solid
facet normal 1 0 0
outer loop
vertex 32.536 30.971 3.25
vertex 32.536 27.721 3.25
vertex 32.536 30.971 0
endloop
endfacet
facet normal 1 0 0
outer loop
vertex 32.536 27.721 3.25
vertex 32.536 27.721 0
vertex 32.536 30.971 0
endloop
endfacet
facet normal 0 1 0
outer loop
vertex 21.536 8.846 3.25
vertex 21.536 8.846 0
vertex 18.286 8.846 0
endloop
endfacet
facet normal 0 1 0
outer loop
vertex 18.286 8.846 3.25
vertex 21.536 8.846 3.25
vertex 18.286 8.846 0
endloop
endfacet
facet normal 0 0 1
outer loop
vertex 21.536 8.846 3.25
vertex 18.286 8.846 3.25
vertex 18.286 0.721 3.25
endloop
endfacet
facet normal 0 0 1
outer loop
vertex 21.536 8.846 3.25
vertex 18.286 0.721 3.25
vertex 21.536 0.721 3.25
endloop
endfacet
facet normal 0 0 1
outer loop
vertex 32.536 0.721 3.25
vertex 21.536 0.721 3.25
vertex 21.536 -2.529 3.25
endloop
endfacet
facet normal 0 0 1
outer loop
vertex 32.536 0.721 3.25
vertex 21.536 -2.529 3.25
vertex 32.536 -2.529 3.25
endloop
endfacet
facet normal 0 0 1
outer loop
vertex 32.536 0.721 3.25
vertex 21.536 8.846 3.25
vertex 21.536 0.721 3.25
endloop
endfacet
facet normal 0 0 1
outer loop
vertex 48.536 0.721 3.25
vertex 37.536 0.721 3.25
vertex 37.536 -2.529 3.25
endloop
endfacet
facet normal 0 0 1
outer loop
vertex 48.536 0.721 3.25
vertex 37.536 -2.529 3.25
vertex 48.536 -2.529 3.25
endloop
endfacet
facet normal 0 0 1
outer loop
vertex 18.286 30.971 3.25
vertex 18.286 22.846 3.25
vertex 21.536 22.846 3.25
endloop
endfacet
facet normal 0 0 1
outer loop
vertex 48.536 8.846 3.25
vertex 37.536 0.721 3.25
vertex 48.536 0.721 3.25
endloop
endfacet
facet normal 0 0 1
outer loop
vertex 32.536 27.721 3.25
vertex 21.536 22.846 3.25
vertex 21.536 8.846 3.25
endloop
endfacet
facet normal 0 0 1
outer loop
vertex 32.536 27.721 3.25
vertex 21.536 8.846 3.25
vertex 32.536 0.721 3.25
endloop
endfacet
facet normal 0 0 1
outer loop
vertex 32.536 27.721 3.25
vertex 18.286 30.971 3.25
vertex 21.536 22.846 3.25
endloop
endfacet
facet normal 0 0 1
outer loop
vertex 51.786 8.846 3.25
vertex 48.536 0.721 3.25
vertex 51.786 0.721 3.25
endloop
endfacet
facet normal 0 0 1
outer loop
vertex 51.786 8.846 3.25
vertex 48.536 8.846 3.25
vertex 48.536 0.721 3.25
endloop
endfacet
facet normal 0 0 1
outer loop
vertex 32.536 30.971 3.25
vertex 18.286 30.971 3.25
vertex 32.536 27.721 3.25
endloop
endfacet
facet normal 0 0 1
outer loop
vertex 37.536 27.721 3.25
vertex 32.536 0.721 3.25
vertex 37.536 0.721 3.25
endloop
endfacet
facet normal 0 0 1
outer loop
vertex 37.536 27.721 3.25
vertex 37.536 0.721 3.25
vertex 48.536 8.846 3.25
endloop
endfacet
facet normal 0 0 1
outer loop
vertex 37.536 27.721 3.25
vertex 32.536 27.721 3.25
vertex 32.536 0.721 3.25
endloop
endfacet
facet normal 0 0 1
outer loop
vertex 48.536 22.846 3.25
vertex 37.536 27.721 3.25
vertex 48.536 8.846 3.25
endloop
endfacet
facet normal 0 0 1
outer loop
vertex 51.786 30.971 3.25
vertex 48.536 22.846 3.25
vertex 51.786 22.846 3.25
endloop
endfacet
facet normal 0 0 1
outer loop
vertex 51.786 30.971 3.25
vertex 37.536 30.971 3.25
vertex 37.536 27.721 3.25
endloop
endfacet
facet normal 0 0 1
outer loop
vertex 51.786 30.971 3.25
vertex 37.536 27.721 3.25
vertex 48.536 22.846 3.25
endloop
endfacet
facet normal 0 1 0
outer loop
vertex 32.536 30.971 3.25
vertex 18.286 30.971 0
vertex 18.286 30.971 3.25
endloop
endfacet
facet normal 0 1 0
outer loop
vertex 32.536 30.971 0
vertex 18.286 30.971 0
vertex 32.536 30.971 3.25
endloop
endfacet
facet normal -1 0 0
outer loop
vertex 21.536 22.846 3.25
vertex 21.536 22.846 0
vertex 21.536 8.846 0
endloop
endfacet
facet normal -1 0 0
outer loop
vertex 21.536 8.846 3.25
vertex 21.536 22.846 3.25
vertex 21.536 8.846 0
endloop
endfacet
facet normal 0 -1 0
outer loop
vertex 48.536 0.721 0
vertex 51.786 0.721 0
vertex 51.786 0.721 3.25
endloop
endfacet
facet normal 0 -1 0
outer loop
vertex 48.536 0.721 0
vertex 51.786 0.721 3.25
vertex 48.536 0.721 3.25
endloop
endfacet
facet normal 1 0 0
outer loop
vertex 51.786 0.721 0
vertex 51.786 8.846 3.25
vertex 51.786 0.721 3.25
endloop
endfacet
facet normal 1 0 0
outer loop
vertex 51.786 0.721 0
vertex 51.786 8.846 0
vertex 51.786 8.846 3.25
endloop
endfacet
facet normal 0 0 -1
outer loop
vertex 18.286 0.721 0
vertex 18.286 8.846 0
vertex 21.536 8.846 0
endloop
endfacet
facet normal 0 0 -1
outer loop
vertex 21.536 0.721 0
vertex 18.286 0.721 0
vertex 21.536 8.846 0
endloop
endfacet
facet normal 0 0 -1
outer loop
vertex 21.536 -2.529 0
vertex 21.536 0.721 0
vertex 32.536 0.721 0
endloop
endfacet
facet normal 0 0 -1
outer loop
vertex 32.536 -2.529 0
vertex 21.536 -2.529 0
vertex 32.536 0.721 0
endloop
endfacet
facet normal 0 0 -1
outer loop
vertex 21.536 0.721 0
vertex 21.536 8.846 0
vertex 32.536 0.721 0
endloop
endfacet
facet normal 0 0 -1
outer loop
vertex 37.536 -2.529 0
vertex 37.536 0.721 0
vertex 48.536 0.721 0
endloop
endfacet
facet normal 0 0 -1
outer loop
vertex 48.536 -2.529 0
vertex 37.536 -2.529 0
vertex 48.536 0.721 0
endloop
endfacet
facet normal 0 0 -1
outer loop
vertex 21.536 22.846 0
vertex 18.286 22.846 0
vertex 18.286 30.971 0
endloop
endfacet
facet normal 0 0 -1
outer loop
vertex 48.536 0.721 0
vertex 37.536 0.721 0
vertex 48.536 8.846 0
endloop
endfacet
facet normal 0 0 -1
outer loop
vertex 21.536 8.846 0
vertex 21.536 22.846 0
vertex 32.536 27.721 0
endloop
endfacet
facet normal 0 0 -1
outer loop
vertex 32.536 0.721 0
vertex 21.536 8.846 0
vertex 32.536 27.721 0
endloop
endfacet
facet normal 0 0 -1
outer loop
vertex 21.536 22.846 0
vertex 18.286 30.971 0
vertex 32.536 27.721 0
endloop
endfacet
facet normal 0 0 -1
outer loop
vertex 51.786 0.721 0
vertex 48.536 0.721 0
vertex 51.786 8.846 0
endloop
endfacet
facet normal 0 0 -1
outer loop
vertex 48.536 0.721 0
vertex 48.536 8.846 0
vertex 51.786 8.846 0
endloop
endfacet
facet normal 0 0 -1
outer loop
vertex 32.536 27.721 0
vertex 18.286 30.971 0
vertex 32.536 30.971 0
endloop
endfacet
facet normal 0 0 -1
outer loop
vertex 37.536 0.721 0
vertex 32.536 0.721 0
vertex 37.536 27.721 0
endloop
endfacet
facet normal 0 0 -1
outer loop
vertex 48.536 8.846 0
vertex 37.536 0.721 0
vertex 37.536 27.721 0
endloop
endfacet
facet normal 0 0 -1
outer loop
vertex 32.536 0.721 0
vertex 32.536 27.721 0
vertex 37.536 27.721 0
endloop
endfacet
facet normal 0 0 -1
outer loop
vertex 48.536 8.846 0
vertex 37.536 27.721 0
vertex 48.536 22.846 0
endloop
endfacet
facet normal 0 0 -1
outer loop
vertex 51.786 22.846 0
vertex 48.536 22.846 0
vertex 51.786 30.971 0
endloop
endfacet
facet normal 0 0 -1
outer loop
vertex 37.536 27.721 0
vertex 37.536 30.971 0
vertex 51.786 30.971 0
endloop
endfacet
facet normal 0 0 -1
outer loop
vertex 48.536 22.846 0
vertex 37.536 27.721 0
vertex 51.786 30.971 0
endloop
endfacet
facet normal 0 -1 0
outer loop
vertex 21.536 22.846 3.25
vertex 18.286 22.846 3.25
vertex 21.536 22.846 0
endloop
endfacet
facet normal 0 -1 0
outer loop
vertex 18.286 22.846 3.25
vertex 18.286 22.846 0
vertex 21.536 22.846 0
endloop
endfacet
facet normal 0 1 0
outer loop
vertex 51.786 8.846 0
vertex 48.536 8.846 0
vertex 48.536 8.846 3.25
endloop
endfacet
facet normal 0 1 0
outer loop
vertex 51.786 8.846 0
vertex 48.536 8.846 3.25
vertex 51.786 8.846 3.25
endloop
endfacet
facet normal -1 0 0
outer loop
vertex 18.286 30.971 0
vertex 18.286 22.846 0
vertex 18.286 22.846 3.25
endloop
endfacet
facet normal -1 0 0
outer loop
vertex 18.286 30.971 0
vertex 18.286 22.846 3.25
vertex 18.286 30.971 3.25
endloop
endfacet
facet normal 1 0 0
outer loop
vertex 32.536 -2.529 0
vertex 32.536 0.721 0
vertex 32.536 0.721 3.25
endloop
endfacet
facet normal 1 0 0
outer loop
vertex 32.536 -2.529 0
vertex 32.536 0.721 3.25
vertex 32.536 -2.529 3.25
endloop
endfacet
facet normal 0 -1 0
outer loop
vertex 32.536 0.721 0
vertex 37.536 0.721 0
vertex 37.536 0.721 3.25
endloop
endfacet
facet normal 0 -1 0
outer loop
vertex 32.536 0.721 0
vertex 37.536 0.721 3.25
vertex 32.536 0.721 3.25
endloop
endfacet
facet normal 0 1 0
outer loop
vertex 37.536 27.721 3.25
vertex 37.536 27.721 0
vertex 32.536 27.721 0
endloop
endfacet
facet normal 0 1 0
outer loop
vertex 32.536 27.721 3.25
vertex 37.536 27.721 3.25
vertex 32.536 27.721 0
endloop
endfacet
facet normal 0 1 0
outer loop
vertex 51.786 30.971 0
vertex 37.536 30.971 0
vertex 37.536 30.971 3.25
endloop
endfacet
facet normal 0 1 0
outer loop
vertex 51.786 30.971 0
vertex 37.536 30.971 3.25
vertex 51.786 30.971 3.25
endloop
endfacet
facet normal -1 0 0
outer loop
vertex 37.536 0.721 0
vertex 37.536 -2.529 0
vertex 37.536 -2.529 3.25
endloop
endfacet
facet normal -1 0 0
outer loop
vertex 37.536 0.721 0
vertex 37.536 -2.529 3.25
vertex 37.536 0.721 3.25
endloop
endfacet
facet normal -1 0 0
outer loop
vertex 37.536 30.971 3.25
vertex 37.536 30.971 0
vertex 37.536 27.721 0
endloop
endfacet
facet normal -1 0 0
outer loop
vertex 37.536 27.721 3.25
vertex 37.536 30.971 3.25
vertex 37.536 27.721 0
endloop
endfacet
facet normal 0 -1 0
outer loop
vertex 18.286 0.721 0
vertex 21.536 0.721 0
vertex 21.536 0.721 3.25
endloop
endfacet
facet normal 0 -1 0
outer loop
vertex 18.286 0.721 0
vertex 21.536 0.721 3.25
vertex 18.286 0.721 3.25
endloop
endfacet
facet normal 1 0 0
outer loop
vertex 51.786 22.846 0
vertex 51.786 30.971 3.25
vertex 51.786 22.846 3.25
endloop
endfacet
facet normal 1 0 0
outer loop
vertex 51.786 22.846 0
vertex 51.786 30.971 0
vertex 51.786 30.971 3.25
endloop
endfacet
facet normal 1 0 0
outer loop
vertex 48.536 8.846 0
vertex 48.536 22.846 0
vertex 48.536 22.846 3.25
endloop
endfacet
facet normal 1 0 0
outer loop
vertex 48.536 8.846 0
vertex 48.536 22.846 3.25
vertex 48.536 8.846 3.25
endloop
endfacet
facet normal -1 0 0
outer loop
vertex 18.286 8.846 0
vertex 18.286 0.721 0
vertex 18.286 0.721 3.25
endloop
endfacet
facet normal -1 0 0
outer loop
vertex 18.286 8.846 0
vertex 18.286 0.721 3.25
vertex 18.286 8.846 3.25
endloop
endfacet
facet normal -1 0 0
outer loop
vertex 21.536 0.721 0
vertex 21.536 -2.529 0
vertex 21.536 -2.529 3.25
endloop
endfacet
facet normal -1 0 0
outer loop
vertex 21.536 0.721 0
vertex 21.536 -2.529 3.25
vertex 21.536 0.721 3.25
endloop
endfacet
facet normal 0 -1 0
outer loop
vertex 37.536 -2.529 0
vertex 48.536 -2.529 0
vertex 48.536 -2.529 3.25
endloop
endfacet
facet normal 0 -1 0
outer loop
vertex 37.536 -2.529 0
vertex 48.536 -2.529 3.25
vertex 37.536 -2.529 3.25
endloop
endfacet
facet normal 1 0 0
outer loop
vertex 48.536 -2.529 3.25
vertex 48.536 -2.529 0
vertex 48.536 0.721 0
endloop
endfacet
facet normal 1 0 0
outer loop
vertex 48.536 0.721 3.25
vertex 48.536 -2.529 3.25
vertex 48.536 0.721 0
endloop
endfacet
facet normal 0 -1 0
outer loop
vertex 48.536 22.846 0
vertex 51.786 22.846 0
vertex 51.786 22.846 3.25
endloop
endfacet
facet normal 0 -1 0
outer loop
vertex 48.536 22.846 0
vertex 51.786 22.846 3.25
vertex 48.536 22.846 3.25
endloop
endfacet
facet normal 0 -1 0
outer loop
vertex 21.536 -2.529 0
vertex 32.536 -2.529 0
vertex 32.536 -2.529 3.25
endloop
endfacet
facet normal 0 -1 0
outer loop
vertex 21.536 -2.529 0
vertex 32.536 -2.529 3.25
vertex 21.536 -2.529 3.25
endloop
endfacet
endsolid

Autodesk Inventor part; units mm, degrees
ref_plane "YZ Plane" through (0, 0, 0) normal (1, 0, 0) x (0, 1, 0)
ref_plane "XZ Plane" through (0, 0, 0) normal (0, 1, 0) x (-1, 0, 0)
ref_plane "XY Plane" through (0, 0, 0) normal (0, 0, 1) x (1, 0, 0)
sketch "Block1" plane through (0, 0, 0) normal (0, 0, 1) x (1, 0, 0)
  circle A0 centre (74.029, 24.2723) radius 1
  line L0 (49.279, 30.4723) -> (71.779, 30.4723)
  line L1 (71.779, 30.4723) -> (71.779, 18.0723)
  line L2 (71.779, 18.0723) -> (49.279, 18.0723)
  line L3 (49.279, 18.0723) -> (49.279, 30.4723)
  line L4 (49.279, 30.4723) -> (44.779, 30.4723)
  line L5 (44.779, 30.4723) -> (44.779, 18.0723)
  line L6 (44.779, 18.0723) -> (49.279, 18.0723)
  line L7 (49.279, 18.0723) -> (49.279, 30.4723)
  line L8 (71.779, 30.4723) -> (76.279, 30.4723)
  line L9 (76.279, 30.4723) -> (76.279, 18.0723)
  line L10 (76.279, 18.0723) -> (71.779, 18.0723)
  line L11 (71.779, 18.0723) -> (71.779, 30.4723)
  line L12 (44.779, 24.2723) -> (76.279, 24.2723) construction
  line L13 (47.029, 30.4723) -> (47.029, 18.0723) construction
  circle A1 centre (47.029, 24.2723) radius 1
  line L14 (74.029, 30.4723) -> (74.029, 18.0723) construction
  point P0 (60.979, 24.0984)
  dimension "d7" = 22.5
  dimension "d8" = 12.4
  dimension "d9" = 4.5
  dimension "d10" = 4.5
  dimension "d11" = 2
  dimension "d12" = 2
sketch "Sketch1" plane through (0, 0, 0) normal (0, 0, 1) x (1, 0, 0)
  line L0 (-92.7646, -8.503) -> (-89.7646, -8.503)
  line L1 (-89.7646, -8.503) -> (-89.7646, -11.753)
  line L2 (-89.7646, -11.753) -> (-92.7646, -11.753)
  line L3 (-92.7646, -11.753) -> (-92.7646, -8.503)
  line L4 (-92.7646, -21.6527) -> (-89.7646, -21.6527)
  line L5 (-89.7646, -21.6527) -> (-89.7646, -21.7527)
  line L6 (-89.7646, -21.7527) -> (-92.7646, -21.7527)
  line L7 (-92.7646, -21.7527) -> (-92.7646, -21.6527)
  line L8 (18.2857, 30.9706) -> (51.7857, 30.9706)
  line L9 (51.7857, 30.9706) -> (51.7857, 0.7206)
  line L10 (51.7857, 0.7206) -> (18.2857, 0.7206)
  line L11 (18.2857, 0.7206) -> (18.2857, 30.9706)
  line L12 (18.2857, 22.8456) -> (21.5357, 22.8456)
  line L13 (21.5357, 22.8456) -> (21.5357, 8.8456)
  line L14 (21.5357, 8.8456) -> (18.2857, 8.8456)
  line L15 (18.2857, 8.8456) -> (18.2857, 22.8456)
  line L16 (35.0357, 30.9706) -> (35.0357, 0.7206) construction
  line L17 (51.7857, 22.8456) -> (48.5357, 22.8456)
  line L18 (48.5357, 22.8456) -> (48.5357, 8.8456)
  line L19 (48.5357, 8.8456) -> (51.7857, 8.8456)
  line L20 (51.7857, 8.8456) -> (51.7857, 22.8456)
  line L21 (32.5357, -2.5294) -> (37.5357, -2.5294)
  line L22 (37.5357, -2.5294) -> (37.5357, 0.7206)
  line L23 (37.5357, 0.7206) -> (32.5357, 0.7206)
  line L24 (32.5357, 0.7206) -> (32.5357, -2.5294)
  line L25 (35.0357, 0.7206) -> (35.0357, -2.5294) construction
  line L26 (18.2857, 14.2206) -> (51.7857, 14.2206) construction
  line L27 (32.5357, 30.9706) -> (37.5357, 30.9706)
  line L28 (37.5357, 30.9706) -> (37.5357, 27.7206)
  line L29 (37.5357, 27.7206) -> (32.5357, 27.7206)
  line L30 (32.5357, 27.7206) -> (32.5357, 30.9706)
  line L31 (35.0357, 27.7206) -> (35.0357, 30.9706) construction
  line L32 (18.2857, 0.7206) -> (51.7857, 0.7206)
  line L33 (51.7857, 0.7206) -> (51.7857, -2.5294)
  line L34 (51.7857, -2.5294) -> (18.2857, -2.5294)
  line L35 (18.2857, -2.5294) -> (18.2857, 0.7206)
  line L36 (18.2857, -2.5294) -> (21.5357, -2.5294)
  line L37 (21.5357, -2.5294) -> (21.5357, 0.7206)
  line L38 (21.5357, 0.7206) -> (18.2857, 0.7206)
  line L39 (18.2857, 0.7206) -> (18.2857, -2.5294)
  line L40 (51.7857, -2.5294) -> (48.5357, -2.5294)
  line L41 (48.5357, -2.5294) -> (48.5357, 0.7206)
  line L42 (48.5357, 0.7206) -> (51.7857, 0.7206)
  line L43 (51.7857, 0.7206) -> (51.7857, -2.5294)
  point P0 (0, 0)
  point P1 (35.0357, 27.7206)
  dimension "d0" = 3
  dimension "mat" = 3.25
  dimension "d2" = 3
  dimension "d3" = 0.1
  dimension "d32" = 33.5
  dimension "d34" = 3.25
  dimension "d35" = 14
  dimension "d36" = 8.125
  dimension "d39" = 5
  dimension "d40" = 3.25
  dimension "d45" = 8.125
  dimension "d46" = 3.25
extrude "Extrusion3" add sketch "Sketch1" along normal blind 3.25 contours L8 L30 L29 L28 L9 L17 L18 L19 L10 L11 L14 L13 L12 | L8 L28 L29 L30
extrude "Extrusion6" add sketch "Sketch1" along normal blind 3.25 contours L10 L37 L34 L35 | L10 L24 L34 L37 | L33 L34 L41 L10 | L10 L41 L34 L22
extrude "Extrusion7" cut sketch "Sketch1" along normal blind 3.25 contours L10 L37 L34 L35 | L33 L34 L41 L10
extrude "Extrusion8" cut sketch "Sketch1" along normal blind 3.25 contours L8 L28 L29 L30
equation "\"d34\" = mat"
equation "\"d40\" = mat"
equation "\"d46\" = mat"
equation "\"d37\" = mat"
equation "\"d47\" = mat"
equation "\"d49\" = mat"
equation "\"d51\" = mat"
properties part number "arm-servo"
